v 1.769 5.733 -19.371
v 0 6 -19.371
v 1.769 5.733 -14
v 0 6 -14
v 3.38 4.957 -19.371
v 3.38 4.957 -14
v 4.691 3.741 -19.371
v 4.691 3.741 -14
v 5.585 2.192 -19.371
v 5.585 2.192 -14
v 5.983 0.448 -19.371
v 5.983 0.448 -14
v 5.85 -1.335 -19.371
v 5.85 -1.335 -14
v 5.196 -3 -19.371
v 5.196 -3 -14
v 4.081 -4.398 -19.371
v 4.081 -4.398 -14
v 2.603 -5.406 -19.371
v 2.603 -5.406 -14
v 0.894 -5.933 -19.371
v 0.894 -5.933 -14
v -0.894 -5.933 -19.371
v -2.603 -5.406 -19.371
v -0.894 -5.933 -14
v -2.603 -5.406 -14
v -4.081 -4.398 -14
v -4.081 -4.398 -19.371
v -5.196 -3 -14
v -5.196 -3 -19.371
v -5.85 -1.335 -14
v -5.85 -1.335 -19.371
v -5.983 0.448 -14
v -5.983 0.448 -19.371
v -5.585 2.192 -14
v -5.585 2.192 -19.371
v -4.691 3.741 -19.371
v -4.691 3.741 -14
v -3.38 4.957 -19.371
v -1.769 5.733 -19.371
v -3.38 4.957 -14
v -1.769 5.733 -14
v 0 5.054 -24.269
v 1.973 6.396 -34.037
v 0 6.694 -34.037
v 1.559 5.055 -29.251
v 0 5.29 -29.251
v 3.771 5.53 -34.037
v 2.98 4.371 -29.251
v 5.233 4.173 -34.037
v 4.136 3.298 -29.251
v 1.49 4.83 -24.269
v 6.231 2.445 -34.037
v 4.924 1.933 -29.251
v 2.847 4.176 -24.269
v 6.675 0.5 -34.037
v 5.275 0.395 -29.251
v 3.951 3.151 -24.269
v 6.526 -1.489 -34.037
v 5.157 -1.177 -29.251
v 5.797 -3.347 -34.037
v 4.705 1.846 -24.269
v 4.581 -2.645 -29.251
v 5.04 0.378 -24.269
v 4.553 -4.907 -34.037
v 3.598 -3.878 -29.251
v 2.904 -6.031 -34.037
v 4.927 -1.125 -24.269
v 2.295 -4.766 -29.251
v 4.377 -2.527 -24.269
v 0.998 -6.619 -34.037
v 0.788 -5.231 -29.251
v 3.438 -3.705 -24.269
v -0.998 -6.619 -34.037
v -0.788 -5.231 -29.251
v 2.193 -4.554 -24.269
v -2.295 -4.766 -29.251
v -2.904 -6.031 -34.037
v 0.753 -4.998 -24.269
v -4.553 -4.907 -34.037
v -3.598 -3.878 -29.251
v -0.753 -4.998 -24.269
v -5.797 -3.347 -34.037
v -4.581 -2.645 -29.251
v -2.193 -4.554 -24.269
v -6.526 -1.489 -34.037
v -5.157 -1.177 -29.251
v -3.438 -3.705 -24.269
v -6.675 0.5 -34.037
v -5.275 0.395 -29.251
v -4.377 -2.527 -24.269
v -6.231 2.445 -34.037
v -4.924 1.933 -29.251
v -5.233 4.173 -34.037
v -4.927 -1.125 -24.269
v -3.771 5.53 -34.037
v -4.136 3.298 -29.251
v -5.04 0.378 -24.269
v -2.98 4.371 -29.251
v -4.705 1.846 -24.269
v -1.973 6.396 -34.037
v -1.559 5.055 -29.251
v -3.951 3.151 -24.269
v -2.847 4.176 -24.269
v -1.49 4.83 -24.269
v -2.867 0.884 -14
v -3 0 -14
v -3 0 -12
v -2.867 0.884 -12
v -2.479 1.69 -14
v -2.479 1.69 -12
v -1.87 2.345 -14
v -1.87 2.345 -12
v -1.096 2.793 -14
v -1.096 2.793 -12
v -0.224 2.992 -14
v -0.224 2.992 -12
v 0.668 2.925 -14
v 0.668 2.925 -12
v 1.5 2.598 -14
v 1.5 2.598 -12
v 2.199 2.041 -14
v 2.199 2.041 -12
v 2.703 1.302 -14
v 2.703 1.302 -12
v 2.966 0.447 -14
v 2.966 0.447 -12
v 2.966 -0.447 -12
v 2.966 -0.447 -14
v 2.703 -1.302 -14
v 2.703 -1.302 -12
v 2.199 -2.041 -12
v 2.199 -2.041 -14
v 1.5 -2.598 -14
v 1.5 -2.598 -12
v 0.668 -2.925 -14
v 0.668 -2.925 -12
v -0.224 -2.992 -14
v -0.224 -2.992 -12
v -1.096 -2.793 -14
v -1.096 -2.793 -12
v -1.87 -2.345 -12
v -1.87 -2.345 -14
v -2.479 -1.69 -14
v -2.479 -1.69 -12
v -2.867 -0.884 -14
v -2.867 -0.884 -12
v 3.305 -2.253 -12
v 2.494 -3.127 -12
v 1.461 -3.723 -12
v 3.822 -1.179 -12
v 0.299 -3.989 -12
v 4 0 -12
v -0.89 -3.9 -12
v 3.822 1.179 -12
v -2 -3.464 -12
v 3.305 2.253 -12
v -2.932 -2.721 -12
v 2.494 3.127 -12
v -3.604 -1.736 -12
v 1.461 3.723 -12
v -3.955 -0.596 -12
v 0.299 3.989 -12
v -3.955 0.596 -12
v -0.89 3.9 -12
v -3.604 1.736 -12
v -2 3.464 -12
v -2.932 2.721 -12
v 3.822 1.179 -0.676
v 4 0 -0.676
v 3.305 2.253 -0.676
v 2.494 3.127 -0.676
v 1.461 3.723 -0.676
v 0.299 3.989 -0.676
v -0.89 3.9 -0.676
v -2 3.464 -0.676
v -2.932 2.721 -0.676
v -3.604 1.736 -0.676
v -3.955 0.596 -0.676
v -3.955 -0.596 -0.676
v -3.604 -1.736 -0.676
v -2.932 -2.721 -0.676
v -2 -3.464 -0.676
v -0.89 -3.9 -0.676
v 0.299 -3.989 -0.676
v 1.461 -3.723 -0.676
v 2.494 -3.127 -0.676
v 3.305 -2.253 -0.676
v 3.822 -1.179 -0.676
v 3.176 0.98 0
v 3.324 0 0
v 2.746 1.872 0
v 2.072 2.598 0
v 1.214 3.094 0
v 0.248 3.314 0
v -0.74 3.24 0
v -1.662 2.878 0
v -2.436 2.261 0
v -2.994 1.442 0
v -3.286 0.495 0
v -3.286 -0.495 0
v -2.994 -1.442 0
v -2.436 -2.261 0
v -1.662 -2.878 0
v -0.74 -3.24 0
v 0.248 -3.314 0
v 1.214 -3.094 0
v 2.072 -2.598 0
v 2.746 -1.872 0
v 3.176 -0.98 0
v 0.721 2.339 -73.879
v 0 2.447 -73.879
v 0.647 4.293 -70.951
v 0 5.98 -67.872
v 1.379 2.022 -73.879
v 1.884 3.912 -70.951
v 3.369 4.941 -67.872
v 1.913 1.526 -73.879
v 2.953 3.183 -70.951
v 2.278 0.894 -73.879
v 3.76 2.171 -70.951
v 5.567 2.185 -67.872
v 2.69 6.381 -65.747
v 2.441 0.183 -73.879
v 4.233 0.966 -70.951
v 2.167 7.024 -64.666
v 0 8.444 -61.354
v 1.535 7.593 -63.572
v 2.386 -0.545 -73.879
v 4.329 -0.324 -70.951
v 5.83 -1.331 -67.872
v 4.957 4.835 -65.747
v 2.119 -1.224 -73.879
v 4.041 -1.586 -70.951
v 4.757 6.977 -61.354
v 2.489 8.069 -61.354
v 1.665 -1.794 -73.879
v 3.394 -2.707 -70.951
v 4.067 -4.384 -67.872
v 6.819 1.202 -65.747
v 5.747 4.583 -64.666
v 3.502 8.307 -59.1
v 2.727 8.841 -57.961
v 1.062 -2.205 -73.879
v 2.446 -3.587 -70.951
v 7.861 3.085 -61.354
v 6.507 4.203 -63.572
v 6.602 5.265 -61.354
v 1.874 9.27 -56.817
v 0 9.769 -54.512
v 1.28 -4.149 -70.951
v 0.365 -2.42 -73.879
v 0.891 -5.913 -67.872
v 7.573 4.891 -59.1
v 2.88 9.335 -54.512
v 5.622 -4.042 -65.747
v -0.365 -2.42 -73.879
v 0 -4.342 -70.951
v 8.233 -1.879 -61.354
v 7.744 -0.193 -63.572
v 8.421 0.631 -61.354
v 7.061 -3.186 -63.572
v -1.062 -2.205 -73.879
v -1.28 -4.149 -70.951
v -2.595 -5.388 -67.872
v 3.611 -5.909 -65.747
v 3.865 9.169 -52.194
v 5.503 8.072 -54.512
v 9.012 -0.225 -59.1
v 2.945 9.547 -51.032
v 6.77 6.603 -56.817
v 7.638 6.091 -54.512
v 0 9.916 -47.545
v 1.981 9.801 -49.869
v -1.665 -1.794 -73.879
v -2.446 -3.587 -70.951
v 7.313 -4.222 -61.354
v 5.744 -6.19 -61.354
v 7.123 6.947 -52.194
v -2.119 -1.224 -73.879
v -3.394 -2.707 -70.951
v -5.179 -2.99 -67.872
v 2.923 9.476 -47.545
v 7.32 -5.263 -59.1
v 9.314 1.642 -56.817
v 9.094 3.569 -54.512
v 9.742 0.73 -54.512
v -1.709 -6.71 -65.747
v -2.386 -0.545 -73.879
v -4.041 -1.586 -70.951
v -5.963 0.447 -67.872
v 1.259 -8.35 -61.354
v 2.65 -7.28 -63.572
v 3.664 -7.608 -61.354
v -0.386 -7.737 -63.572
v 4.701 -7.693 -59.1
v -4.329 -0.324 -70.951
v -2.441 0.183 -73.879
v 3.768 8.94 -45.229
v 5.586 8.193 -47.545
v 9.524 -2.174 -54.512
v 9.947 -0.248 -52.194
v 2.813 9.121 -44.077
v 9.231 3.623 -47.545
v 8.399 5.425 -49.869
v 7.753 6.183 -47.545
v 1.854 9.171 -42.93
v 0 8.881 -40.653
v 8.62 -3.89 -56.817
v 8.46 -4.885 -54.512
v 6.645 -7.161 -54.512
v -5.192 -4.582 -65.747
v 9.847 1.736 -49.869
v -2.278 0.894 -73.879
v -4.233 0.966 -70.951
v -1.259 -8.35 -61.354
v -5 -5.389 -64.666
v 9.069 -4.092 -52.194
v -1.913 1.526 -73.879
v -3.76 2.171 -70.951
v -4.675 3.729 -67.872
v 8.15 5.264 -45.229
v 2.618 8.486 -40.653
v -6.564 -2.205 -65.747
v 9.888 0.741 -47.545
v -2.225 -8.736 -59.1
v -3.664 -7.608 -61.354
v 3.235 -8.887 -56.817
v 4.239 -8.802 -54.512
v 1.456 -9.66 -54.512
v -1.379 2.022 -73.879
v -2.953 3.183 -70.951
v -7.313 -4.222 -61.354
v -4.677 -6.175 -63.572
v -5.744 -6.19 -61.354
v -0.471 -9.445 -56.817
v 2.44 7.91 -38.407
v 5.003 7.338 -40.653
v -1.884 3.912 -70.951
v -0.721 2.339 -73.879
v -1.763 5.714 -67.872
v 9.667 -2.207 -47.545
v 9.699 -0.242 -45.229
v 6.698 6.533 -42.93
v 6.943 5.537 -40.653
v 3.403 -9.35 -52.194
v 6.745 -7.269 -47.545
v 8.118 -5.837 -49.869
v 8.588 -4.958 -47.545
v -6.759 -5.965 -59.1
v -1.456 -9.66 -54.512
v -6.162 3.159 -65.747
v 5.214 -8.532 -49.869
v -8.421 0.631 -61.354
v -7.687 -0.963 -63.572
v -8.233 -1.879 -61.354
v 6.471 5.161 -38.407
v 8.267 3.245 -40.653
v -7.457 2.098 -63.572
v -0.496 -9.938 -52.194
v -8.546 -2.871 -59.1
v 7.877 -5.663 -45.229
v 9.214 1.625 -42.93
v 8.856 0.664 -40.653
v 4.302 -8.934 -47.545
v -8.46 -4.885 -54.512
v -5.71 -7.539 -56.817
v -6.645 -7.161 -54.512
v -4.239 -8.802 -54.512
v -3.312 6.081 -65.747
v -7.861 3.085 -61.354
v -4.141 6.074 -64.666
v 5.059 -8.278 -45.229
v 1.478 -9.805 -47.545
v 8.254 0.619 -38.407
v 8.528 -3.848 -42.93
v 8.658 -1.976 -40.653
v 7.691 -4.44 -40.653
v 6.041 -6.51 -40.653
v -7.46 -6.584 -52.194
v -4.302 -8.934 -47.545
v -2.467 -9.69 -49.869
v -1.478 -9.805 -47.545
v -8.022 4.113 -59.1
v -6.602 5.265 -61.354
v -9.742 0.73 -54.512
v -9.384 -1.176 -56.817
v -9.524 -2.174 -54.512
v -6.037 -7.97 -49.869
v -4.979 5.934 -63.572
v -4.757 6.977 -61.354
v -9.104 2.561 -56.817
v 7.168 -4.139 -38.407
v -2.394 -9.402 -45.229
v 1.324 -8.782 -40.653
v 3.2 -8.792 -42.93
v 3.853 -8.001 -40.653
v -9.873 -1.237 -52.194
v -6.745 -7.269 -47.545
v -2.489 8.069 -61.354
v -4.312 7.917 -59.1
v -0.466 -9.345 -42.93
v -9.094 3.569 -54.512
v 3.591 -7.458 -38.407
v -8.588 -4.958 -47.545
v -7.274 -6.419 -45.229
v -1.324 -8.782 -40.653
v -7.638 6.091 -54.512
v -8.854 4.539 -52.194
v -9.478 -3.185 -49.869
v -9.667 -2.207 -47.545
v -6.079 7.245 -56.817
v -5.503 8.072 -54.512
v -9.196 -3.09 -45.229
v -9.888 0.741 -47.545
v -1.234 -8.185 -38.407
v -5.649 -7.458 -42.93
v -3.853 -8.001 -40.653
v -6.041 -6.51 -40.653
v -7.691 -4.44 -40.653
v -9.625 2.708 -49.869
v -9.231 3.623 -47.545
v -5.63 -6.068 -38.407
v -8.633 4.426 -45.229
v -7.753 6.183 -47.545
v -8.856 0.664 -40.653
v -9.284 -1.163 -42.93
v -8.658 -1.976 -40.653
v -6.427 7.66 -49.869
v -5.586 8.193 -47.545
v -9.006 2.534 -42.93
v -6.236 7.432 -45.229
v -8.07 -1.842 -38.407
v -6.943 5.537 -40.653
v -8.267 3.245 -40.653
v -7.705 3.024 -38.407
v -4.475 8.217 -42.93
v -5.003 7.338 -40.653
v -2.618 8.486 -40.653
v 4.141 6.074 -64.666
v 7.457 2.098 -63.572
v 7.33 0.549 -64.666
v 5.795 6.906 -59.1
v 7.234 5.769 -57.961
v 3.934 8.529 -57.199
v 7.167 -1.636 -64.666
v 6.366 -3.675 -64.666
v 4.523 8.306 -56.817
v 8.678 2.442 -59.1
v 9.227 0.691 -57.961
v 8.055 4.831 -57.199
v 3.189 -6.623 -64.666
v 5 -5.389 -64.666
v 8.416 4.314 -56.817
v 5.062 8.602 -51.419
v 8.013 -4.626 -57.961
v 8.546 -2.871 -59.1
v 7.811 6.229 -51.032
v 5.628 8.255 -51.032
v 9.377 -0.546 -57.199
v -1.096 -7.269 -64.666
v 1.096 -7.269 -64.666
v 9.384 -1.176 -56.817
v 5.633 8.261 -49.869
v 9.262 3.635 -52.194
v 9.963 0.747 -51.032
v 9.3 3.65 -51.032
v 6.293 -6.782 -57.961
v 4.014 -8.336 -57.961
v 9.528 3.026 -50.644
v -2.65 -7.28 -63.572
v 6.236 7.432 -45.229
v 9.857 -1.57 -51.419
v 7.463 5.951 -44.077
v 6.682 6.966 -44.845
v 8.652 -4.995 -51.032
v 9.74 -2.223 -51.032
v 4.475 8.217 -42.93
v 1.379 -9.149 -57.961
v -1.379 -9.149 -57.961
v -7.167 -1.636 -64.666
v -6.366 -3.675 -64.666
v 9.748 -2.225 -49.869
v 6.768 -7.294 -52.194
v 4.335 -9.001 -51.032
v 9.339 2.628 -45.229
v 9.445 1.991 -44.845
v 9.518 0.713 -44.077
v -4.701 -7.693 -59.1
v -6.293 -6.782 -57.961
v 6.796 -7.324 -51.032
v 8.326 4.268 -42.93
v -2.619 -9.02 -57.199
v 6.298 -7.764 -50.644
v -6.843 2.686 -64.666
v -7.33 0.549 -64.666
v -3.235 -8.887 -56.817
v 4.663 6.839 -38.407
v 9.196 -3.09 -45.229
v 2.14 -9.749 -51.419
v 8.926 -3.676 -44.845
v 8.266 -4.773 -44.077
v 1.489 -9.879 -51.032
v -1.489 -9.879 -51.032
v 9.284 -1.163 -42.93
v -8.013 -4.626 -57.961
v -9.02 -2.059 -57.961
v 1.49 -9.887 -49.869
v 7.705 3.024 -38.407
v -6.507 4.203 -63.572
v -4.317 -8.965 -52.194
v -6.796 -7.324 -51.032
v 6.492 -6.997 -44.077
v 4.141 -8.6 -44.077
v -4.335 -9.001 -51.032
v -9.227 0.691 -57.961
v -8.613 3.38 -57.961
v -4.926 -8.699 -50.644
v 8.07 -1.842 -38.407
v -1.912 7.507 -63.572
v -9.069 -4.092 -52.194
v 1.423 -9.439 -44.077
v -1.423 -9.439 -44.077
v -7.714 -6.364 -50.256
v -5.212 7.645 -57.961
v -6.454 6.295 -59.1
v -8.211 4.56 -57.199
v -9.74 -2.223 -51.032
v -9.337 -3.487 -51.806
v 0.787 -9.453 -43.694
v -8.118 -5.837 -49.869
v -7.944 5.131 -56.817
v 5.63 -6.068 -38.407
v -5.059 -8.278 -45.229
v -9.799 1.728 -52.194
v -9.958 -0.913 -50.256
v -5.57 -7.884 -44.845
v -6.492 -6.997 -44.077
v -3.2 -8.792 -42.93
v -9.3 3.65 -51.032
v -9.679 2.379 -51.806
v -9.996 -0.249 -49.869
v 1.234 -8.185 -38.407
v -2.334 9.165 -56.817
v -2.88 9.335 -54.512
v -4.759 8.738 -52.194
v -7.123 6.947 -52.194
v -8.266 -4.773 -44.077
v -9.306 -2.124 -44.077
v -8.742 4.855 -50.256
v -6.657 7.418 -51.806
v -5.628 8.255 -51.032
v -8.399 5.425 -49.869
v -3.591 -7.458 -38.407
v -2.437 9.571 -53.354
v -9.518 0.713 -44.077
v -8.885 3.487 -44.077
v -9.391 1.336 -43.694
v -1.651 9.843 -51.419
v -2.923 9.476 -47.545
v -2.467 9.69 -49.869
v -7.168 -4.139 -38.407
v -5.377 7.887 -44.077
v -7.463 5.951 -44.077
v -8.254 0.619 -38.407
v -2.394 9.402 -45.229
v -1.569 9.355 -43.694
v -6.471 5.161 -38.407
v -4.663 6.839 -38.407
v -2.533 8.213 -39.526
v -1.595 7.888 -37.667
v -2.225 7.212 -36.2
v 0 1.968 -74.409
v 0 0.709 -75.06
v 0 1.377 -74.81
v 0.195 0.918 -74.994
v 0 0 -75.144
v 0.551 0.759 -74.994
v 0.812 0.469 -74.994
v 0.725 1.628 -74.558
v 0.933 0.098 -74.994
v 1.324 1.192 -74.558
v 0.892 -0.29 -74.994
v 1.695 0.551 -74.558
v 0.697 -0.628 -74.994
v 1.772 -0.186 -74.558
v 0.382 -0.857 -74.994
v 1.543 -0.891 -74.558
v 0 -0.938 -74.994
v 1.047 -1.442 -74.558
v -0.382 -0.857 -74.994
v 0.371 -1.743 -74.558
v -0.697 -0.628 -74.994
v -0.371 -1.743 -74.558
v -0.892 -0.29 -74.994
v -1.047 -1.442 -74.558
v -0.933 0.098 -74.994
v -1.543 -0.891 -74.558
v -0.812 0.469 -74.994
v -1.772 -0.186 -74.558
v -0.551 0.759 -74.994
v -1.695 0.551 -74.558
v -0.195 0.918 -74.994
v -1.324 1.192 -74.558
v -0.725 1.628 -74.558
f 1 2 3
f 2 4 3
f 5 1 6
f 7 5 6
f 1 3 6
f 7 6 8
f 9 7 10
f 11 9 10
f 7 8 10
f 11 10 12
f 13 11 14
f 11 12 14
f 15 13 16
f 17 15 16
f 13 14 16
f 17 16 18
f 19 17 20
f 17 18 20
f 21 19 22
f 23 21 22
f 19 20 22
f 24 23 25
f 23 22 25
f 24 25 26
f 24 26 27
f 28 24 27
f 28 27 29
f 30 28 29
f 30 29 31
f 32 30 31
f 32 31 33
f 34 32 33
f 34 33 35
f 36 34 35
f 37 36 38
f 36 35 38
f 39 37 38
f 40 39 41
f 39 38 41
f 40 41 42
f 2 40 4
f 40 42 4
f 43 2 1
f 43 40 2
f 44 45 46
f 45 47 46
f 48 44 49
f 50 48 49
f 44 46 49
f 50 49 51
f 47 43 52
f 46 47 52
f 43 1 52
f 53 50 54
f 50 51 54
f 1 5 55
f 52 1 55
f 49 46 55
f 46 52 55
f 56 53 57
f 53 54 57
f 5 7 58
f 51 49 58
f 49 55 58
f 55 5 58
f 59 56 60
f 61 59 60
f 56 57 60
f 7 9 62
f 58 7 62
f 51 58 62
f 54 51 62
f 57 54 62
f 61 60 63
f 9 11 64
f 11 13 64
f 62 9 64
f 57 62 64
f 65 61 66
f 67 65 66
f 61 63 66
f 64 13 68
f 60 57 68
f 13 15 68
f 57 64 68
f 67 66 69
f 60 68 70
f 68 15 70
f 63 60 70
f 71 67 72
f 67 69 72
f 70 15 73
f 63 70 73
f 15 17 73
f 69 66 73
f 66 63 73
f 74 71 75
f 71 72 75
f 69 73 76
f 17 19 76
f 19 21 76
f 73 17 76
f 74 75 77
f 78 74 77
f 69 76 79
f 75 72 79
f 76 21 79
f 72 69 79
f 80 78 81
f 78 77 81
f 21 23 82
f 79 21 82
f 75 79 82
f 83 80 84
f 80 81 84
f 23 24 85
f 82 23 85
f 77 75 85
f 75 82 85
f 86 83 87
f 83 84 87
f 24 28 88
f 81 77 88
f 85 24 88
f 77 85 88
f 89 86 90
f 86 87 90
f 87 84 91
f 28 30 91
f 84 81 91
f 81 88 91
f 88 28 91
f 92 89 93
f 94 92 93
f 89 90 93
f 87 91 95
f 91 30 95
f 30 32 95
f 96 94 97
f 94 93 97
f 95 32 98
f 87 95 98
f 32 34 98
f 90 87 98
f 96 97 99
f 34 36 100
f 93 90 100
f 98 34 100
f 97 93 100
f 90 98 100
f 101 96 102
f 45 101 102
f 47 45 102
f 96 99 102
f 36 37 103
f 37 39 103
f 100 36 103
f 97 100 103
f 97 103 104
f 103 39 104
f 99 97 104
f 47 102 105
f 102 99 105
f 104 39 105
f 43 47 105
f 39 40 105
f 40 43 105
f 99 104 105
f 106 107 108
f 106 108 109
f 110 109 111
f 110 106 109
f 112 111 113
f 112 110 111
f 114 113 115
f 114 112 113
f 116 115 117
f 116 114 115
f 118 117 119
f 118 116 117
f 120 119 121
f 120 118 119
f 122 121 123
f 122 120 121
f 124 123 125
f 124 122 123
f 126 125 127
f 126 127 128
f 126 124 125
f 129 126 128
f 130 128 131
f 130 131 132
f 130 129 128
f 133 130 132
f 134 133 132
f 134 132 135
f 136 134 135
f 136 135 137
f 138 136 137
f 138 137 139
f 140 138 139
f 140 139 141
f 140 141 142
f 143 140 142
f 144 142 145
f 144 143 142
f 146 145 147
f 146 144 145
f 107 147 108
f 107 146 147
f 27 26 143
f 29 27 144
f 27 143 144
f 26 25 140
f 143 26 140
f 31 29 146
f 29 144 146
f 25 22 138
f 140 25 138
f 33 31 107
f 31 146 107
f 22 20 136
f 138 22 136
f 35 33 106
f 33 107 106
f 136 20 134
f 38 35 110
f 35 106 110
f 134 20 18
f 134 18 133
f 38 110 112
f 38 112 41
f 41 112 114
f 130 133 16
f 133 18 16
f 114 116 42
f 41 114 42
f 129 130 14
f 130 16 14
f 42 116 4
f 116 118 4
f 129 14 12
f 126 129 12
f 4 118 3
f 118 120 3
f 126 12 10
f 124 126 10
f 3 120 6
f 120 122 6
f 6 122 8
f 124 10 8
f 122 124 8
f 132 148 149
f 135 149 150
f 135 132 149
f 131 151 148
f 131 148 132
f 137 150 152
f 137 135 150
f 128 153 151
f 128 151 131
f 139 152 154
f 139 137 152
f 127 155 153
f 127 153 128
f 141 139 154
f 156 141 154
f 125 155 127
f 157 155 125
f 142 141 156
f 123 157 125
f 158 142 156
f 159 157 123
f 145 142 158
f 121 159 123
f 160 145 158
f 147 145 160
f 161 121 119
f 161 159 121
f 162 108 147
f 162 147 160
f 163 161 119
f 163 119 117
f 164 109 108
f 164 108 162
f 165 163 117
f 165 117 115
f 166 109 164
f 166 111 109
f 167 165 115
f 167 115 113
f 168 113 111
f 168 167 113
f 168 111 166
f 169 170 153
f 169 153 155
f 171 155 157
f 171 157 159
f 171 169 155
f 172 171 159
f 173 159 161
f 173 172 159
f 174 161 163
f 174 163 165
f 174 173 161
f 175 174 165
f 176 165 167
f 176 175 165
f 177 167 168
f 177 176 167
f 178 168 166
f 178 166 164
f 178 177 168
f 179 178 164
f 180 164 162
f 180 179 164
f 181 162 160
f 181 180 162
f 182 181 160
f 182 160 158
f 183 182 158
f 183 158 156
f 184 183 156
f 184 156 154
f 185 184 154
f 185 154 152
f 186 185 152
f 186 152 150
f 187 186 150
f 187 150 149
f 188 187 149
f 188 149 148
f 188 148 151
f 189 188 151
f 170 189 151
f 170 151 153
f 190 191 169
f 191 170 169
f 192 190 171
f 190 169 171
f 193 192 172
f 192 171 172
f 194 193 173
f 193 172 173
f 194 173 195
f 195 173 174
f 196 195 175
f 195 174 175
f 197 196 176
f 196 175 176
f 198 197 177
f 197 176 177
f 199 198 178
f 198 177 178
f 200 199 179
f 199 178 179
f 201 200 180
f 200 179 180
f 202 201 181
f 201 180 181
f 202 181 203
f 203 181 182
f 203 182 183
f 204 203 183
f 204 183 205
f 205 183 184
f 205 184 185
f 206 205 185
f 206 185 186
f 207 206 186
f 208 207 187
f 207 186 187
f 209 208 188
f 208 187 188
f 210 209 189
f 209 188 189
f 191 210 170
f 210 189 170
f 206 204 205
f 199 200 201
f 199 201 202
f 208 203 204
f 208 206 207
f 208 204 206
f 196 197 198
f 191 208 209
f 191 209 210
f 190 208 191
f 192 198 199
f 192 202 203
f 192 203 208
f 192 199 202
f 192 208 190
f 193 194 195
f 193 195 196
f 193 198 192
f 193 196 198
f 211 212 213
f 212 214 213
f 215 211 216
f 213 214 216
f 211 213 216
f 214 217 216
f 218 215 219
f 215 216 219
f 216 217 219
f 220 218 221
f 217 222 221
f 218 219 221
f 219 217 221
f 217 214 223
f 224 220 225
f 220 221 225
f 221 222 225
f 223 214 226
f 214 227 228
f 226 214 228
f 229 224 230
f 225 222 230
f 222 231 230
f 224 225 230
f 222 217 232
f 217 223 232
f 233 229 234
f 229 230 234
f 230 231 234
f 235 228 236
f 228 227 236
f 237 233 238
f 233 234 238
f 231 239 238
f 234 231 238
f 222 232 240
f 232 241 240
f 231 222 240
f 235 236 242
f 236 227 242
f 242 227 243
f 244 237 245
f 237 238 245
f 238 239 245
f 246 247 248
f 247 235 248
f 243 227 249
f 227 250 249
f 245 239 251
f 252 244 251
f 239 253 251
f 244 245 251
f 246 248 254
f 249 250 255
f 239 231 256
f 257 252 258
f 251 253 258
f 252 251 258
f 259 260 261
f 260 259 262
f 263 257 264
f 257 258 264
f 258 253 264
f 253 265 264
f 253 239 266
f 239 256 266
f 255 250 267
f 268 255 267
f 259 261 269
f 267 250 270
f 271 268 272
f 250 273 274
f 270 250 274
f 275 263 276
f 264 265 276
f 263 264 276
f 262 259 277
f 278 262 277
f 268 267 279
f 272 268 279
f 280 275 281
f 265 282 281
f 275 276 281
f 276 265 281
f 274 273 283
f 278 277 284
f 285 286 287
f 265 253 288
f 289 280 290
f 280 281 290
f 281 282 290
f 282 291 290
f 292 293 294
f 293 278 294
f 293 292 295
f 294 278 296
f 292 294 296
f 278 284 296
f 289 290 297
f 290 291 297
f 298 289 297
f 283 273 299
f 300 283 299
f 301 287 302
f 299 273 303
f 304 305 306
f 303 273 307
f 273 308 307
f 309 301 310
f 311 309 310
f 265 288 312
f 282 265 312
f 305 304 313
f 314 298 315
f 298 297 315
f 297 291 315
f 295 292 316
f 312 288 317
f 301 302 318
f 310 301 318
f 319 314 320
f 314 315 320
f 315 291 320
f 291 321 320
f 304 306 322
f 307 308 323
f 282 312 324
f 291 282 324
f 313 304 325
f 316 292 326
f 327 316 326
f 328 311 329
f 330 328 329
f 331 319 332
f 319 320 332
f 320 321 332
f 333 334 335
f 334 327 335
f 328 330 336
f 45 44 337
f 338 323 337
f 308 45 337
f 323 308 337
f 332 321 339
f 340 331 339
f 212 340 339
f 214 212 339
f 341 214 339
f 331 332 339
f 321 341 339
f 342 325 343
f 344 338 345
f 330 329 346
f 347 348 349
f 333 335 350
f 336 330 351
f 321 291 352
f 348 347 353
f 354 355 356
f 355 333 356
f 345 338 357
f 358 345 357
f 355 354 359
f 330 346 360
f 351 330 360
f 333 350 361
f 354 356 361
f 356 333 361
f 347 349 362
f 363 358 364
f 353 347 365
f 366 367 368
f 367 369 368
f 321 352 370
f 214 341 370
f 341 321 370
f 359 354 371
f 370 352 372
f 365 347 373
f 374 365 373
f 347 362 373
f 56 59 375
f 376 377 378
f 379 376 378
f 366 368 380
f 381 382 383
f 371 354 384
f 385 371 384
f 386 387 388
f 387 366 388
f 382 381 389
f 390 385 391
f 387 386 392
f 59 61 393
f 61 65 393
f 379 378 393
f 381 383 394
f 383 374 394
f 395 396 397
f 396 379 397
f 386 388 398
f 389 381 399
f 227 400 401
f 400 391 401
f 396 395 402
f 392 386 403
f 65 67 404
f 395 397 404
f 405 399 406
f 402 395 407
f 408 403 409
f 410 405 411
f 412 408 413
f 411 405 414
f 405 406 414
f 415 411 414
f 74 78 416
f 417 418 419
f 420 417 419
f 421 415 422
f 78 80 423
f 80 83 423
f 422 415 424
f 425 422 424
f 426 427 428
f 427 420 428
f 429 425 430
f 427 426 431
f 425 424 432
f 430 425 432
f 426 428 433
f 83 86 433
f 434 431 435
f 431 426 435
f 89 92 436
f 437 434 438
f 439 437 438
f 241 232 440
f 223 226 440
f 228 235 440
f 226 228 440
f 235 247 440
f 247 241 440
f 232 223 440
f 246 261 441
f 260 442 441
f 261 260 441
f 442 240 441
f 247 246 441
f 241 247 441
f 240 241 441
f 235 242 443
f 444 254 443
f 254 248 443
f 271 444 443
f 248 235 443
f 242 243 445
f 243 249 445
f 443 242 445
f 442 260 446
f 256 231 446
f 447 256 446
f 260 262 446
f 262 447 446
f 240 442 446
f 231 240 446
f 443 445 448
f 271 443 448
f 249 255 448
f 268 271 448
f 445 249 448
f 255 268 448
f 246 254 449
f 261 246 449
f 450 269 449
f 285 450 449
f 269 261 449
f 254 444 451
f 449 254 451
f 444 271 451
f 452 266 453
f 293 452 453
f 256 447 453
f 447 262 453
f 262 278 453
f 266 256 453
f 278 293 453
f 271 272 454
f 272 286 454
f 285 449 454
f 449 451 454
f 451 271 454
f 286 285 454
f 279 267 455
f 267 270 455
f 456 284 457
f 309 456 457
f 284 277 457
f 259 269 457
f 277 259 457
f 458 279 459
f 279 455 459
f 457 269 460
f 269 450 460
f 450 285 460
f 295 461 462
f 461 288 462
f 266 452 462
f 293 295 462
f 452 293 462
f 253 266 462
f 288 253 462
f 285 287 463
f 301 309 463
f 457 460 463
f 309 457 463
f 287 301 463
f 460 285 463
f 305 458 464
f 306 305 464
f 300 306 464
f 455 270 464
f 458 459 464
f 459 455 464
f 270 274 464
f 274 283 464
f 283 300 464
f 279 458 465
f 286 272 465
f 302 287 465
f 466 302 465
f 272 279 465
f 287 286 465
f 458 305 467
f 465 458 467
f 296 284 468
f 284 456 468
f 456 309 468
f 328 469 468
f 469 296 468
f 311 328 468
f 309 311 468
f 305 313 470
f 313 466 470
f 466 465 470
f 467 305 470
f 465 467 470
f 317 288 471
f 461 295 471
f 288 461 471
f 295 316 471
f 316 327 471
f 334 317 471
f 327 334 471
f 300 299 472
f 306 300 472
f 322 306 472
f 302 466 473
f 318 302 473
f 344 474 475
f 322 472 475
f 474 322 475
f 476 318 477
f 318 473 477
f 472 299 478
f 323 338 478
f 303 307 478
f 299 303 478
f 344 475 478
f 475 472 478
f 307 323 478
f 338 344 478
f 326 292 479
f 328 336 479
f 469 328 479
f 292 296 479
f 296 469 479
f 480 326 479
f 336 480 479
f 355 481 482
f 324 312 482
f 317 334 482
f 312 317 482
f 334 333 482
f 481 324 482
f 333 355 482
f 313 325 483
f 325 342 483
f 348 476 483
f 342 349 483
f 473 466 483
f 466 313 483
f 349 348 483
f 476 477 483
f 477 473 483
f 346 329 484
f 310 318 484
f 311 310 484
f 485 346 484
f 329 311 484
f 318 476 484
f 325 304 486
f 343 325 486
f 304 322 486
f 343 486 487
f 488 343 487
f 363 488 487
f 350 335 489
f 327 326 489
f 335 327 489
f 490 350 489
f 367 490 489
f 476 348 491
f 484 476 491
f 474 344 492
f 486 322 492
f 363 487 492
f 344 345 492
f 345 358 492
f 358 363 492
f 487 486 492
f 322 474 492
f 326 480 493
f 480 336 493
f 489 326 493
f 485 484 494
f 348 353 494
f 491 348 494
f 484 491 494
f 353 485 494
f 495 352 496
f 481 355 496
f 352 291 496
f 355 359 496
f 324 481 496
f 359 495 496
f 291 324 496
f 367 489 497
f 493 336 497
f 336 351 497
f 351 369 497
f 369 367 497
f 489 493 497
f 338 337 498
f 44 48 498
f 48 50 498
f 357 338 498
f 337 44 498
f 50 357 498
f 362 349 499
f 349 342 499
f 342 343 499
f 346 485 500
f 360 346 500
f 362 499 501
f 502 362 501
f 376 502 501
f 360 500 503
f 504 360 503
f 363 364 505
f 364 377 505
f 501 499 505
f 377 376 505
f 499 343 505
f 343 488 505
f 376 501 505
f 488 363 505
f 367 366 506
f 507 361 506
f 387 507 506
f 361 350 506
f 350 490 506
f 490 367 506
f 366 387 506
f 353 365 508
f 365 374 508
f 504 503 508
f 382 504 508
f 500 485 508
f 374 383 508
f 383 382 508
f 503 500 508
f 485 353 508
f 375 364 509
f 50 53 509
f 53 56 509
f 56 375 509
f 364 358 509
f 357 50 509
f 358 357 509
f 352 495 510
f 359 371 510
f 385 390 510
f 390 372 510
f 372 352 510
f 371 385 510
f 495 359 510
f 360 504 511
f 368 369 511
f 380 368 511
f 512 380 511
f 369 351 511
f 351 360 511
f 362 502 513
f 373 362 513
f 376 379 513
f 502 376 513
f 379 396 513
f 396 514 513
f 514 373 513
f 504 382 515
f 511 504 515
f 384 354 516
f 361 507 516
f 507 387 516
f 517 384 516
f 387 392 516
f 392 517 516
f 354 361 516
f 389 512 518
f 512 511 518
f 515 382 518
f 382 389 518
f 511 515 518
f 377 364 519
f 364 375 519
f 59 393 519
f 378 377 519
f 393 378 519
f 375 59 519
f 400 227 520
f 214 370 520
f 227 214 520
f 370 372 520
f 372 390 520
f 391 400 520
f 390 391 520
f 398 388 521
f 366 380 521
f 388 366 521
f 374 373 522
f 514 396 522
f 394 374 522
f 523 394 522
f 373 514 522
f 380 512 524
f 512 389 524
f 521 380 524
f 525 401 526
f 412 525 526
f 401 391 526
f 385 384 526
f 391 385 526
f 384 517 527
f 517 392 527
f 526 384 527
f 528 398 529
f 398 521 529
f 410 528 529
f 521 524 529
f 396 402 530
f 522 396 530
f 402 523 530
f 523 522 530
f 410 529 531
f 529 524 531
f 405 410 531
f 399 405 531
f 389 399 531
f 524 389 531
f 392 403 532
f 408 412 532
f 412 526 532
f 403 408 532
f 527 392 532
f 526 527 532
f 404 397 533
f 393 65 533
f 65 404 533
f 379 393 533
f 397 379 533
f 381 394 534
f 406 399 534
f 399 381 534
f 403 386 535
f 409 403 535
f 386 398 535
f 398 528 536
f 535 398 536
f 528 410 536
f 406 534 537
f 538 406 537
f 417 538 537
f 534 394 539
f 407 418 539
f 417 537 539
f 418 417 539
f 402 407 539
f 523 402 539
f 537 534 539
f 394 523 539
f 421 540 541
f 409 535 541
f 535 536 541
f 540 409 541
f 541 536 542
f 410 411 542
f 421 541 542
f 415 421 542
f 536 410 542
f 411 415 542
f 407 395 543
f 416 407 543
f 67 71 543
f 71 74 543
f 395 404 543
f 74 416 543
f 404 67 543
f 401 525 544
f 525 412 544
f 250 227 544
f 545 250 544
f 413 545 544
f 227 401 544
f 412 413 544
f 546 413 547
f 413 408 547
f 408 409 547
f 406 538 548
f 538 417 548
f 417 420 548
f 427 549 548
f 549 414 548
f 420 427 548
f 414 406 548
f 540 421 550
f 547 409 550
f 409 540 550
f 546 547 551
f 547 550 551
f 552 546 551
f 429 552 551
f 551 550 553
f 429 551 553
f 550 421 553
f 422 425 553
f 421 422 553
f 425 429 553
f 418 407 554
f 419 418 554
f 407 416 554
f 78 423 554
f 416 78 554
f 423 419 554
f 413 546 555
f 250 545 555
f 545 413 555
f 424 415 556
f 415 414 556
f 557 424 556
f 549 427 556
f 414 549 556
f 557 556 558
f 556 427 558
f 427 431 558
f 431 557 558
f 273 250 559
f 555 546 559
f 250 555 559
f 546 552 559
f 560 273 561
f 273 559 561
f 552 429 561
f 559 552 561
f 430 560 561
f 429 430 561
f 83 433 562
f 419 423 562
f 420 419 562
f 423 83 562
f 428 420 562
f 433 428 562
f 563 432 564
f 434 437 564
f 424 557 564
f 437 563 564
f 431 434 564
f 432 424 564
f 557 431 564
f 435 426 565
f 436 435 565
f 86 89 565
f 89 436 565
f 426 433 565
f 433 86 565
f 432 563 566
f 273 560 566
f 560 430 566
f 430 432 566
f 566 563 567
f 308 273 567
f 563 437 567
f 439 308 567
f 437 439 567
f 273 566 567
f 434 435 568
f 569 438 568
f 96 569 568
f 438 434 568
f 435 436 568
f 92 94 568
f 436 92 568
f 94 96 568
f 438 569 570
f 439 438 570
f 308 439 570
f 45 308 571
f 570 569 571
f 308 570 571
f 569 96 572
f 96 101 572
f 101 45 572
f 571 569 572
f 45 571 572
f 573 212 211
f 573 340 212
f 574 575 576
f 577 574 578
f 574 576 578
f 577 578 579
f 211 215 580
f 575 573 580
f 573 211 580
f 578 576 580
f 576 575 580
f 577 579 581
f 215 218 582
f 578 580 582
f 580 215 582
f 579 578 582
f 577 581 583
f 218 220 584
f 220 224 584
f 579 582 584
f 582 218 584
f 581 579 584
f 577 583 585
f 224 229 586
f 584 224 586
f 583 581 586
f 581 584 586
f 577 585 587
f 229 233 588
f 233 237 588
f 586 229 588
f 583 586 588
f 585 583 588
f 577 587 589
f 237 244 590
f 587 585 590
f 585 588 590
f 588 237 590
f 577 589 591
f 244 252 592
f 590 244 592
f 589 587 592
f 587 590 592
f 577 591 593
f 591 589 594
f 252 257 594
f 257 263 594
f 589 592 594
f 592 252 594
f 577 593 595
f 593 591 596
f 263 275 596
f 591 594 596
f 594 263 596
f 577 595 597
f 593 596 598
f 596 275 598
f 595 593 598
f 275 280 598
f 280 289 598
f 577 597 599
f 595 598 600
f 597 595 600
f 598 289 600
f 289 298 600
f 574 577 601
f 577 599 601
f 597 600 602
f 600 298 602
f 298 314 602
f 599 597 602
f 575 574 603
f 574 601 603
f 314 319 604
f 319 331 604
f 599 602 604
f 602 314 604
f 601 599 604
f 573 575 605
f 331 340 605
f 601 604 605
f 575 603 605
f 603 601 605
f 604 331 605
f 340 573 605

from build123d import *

# Parameters (mm, degrees)
SKETCH_1_R          = 4
EXTRUDE_1_DEPTH     = 14
SKETCH_2_OUTSIDE_W  = 13.6
SKETCH_2_OUTSIDE_H  = 13.6
SKETCH_2_OUTSIDE_R  = 3
CUT_EXTRUDE_1_DEPTH = 2


# Read off the part's stored shape, not the designer's step: M8 机械螺纹 螺柱1
with BuildPart() as part:
    # 草图1 → 凸台-拉伸1 (new body)
    with BuildSketch(Plane.XY):
        Circle(SKETCH_1_R)
    extrude(amount=-EXTRUDE_1_DEPTH)

    # 草图2 outside → 切除-拉伸1 (cut)
    with BuildSketch(Plane(origin=(0, 0, -14), x_dir=(-1, 0, 0), z_dir=(0, 0, -1))):
        Rectangle(SKETCH_2_OUTSIDE_W, SKETCH_2_OUTSIDE_H)
        Circle(SKETCH_2_OUTSIDE_R, mode=Mode.SUBTRACT)
    extrude(amount=-CUT_EXTRUDE_1_DEPTH, mode=Mode.SUBTRACT)

    # M8 机械螺纹 螺柱1 outline → M8 机械螺纹 螺柱1 (revolve, cut)
    with BuildSketch(Plane.XZ):
        Polygon((4, 0), (3.3235, 0), (4, -0.6765), align=None)
    revolve(axis=Axis((0, 0, 0), (0, 0, 1)), mode=Mode.SUBTRACT)

    # 草图4 one side → 旋转1 (revolve)
    with BuildSketch(Plane(origin=(0, 0, 0), x_dir=(0, 0, -1), z_dir=(1, 0, 0))):
        with BuildLine():
            Line((14, 6), (14, 0))
            Line((14, 0), (75.144445246, 0))
            ThreePointArc((75.144445246, 0), (74.809510044, 1.377472185), (73.879492165, 2.447368421))
            ThreePointArc((73.879492165, 2.447368421), (54.51207399, 9.769129661), (34.036579508, 6.693548387))
            ThreePointArc((34.036579508, 6.693548387), (26.766592165, 5.023444587), (19.371438197, 6))
            Line((19.371438197, 6), (14, 6))
        make_face()
    revolve(axis=Axis((0, 0, -14), (0, 0, -1)))


solid = part.part
